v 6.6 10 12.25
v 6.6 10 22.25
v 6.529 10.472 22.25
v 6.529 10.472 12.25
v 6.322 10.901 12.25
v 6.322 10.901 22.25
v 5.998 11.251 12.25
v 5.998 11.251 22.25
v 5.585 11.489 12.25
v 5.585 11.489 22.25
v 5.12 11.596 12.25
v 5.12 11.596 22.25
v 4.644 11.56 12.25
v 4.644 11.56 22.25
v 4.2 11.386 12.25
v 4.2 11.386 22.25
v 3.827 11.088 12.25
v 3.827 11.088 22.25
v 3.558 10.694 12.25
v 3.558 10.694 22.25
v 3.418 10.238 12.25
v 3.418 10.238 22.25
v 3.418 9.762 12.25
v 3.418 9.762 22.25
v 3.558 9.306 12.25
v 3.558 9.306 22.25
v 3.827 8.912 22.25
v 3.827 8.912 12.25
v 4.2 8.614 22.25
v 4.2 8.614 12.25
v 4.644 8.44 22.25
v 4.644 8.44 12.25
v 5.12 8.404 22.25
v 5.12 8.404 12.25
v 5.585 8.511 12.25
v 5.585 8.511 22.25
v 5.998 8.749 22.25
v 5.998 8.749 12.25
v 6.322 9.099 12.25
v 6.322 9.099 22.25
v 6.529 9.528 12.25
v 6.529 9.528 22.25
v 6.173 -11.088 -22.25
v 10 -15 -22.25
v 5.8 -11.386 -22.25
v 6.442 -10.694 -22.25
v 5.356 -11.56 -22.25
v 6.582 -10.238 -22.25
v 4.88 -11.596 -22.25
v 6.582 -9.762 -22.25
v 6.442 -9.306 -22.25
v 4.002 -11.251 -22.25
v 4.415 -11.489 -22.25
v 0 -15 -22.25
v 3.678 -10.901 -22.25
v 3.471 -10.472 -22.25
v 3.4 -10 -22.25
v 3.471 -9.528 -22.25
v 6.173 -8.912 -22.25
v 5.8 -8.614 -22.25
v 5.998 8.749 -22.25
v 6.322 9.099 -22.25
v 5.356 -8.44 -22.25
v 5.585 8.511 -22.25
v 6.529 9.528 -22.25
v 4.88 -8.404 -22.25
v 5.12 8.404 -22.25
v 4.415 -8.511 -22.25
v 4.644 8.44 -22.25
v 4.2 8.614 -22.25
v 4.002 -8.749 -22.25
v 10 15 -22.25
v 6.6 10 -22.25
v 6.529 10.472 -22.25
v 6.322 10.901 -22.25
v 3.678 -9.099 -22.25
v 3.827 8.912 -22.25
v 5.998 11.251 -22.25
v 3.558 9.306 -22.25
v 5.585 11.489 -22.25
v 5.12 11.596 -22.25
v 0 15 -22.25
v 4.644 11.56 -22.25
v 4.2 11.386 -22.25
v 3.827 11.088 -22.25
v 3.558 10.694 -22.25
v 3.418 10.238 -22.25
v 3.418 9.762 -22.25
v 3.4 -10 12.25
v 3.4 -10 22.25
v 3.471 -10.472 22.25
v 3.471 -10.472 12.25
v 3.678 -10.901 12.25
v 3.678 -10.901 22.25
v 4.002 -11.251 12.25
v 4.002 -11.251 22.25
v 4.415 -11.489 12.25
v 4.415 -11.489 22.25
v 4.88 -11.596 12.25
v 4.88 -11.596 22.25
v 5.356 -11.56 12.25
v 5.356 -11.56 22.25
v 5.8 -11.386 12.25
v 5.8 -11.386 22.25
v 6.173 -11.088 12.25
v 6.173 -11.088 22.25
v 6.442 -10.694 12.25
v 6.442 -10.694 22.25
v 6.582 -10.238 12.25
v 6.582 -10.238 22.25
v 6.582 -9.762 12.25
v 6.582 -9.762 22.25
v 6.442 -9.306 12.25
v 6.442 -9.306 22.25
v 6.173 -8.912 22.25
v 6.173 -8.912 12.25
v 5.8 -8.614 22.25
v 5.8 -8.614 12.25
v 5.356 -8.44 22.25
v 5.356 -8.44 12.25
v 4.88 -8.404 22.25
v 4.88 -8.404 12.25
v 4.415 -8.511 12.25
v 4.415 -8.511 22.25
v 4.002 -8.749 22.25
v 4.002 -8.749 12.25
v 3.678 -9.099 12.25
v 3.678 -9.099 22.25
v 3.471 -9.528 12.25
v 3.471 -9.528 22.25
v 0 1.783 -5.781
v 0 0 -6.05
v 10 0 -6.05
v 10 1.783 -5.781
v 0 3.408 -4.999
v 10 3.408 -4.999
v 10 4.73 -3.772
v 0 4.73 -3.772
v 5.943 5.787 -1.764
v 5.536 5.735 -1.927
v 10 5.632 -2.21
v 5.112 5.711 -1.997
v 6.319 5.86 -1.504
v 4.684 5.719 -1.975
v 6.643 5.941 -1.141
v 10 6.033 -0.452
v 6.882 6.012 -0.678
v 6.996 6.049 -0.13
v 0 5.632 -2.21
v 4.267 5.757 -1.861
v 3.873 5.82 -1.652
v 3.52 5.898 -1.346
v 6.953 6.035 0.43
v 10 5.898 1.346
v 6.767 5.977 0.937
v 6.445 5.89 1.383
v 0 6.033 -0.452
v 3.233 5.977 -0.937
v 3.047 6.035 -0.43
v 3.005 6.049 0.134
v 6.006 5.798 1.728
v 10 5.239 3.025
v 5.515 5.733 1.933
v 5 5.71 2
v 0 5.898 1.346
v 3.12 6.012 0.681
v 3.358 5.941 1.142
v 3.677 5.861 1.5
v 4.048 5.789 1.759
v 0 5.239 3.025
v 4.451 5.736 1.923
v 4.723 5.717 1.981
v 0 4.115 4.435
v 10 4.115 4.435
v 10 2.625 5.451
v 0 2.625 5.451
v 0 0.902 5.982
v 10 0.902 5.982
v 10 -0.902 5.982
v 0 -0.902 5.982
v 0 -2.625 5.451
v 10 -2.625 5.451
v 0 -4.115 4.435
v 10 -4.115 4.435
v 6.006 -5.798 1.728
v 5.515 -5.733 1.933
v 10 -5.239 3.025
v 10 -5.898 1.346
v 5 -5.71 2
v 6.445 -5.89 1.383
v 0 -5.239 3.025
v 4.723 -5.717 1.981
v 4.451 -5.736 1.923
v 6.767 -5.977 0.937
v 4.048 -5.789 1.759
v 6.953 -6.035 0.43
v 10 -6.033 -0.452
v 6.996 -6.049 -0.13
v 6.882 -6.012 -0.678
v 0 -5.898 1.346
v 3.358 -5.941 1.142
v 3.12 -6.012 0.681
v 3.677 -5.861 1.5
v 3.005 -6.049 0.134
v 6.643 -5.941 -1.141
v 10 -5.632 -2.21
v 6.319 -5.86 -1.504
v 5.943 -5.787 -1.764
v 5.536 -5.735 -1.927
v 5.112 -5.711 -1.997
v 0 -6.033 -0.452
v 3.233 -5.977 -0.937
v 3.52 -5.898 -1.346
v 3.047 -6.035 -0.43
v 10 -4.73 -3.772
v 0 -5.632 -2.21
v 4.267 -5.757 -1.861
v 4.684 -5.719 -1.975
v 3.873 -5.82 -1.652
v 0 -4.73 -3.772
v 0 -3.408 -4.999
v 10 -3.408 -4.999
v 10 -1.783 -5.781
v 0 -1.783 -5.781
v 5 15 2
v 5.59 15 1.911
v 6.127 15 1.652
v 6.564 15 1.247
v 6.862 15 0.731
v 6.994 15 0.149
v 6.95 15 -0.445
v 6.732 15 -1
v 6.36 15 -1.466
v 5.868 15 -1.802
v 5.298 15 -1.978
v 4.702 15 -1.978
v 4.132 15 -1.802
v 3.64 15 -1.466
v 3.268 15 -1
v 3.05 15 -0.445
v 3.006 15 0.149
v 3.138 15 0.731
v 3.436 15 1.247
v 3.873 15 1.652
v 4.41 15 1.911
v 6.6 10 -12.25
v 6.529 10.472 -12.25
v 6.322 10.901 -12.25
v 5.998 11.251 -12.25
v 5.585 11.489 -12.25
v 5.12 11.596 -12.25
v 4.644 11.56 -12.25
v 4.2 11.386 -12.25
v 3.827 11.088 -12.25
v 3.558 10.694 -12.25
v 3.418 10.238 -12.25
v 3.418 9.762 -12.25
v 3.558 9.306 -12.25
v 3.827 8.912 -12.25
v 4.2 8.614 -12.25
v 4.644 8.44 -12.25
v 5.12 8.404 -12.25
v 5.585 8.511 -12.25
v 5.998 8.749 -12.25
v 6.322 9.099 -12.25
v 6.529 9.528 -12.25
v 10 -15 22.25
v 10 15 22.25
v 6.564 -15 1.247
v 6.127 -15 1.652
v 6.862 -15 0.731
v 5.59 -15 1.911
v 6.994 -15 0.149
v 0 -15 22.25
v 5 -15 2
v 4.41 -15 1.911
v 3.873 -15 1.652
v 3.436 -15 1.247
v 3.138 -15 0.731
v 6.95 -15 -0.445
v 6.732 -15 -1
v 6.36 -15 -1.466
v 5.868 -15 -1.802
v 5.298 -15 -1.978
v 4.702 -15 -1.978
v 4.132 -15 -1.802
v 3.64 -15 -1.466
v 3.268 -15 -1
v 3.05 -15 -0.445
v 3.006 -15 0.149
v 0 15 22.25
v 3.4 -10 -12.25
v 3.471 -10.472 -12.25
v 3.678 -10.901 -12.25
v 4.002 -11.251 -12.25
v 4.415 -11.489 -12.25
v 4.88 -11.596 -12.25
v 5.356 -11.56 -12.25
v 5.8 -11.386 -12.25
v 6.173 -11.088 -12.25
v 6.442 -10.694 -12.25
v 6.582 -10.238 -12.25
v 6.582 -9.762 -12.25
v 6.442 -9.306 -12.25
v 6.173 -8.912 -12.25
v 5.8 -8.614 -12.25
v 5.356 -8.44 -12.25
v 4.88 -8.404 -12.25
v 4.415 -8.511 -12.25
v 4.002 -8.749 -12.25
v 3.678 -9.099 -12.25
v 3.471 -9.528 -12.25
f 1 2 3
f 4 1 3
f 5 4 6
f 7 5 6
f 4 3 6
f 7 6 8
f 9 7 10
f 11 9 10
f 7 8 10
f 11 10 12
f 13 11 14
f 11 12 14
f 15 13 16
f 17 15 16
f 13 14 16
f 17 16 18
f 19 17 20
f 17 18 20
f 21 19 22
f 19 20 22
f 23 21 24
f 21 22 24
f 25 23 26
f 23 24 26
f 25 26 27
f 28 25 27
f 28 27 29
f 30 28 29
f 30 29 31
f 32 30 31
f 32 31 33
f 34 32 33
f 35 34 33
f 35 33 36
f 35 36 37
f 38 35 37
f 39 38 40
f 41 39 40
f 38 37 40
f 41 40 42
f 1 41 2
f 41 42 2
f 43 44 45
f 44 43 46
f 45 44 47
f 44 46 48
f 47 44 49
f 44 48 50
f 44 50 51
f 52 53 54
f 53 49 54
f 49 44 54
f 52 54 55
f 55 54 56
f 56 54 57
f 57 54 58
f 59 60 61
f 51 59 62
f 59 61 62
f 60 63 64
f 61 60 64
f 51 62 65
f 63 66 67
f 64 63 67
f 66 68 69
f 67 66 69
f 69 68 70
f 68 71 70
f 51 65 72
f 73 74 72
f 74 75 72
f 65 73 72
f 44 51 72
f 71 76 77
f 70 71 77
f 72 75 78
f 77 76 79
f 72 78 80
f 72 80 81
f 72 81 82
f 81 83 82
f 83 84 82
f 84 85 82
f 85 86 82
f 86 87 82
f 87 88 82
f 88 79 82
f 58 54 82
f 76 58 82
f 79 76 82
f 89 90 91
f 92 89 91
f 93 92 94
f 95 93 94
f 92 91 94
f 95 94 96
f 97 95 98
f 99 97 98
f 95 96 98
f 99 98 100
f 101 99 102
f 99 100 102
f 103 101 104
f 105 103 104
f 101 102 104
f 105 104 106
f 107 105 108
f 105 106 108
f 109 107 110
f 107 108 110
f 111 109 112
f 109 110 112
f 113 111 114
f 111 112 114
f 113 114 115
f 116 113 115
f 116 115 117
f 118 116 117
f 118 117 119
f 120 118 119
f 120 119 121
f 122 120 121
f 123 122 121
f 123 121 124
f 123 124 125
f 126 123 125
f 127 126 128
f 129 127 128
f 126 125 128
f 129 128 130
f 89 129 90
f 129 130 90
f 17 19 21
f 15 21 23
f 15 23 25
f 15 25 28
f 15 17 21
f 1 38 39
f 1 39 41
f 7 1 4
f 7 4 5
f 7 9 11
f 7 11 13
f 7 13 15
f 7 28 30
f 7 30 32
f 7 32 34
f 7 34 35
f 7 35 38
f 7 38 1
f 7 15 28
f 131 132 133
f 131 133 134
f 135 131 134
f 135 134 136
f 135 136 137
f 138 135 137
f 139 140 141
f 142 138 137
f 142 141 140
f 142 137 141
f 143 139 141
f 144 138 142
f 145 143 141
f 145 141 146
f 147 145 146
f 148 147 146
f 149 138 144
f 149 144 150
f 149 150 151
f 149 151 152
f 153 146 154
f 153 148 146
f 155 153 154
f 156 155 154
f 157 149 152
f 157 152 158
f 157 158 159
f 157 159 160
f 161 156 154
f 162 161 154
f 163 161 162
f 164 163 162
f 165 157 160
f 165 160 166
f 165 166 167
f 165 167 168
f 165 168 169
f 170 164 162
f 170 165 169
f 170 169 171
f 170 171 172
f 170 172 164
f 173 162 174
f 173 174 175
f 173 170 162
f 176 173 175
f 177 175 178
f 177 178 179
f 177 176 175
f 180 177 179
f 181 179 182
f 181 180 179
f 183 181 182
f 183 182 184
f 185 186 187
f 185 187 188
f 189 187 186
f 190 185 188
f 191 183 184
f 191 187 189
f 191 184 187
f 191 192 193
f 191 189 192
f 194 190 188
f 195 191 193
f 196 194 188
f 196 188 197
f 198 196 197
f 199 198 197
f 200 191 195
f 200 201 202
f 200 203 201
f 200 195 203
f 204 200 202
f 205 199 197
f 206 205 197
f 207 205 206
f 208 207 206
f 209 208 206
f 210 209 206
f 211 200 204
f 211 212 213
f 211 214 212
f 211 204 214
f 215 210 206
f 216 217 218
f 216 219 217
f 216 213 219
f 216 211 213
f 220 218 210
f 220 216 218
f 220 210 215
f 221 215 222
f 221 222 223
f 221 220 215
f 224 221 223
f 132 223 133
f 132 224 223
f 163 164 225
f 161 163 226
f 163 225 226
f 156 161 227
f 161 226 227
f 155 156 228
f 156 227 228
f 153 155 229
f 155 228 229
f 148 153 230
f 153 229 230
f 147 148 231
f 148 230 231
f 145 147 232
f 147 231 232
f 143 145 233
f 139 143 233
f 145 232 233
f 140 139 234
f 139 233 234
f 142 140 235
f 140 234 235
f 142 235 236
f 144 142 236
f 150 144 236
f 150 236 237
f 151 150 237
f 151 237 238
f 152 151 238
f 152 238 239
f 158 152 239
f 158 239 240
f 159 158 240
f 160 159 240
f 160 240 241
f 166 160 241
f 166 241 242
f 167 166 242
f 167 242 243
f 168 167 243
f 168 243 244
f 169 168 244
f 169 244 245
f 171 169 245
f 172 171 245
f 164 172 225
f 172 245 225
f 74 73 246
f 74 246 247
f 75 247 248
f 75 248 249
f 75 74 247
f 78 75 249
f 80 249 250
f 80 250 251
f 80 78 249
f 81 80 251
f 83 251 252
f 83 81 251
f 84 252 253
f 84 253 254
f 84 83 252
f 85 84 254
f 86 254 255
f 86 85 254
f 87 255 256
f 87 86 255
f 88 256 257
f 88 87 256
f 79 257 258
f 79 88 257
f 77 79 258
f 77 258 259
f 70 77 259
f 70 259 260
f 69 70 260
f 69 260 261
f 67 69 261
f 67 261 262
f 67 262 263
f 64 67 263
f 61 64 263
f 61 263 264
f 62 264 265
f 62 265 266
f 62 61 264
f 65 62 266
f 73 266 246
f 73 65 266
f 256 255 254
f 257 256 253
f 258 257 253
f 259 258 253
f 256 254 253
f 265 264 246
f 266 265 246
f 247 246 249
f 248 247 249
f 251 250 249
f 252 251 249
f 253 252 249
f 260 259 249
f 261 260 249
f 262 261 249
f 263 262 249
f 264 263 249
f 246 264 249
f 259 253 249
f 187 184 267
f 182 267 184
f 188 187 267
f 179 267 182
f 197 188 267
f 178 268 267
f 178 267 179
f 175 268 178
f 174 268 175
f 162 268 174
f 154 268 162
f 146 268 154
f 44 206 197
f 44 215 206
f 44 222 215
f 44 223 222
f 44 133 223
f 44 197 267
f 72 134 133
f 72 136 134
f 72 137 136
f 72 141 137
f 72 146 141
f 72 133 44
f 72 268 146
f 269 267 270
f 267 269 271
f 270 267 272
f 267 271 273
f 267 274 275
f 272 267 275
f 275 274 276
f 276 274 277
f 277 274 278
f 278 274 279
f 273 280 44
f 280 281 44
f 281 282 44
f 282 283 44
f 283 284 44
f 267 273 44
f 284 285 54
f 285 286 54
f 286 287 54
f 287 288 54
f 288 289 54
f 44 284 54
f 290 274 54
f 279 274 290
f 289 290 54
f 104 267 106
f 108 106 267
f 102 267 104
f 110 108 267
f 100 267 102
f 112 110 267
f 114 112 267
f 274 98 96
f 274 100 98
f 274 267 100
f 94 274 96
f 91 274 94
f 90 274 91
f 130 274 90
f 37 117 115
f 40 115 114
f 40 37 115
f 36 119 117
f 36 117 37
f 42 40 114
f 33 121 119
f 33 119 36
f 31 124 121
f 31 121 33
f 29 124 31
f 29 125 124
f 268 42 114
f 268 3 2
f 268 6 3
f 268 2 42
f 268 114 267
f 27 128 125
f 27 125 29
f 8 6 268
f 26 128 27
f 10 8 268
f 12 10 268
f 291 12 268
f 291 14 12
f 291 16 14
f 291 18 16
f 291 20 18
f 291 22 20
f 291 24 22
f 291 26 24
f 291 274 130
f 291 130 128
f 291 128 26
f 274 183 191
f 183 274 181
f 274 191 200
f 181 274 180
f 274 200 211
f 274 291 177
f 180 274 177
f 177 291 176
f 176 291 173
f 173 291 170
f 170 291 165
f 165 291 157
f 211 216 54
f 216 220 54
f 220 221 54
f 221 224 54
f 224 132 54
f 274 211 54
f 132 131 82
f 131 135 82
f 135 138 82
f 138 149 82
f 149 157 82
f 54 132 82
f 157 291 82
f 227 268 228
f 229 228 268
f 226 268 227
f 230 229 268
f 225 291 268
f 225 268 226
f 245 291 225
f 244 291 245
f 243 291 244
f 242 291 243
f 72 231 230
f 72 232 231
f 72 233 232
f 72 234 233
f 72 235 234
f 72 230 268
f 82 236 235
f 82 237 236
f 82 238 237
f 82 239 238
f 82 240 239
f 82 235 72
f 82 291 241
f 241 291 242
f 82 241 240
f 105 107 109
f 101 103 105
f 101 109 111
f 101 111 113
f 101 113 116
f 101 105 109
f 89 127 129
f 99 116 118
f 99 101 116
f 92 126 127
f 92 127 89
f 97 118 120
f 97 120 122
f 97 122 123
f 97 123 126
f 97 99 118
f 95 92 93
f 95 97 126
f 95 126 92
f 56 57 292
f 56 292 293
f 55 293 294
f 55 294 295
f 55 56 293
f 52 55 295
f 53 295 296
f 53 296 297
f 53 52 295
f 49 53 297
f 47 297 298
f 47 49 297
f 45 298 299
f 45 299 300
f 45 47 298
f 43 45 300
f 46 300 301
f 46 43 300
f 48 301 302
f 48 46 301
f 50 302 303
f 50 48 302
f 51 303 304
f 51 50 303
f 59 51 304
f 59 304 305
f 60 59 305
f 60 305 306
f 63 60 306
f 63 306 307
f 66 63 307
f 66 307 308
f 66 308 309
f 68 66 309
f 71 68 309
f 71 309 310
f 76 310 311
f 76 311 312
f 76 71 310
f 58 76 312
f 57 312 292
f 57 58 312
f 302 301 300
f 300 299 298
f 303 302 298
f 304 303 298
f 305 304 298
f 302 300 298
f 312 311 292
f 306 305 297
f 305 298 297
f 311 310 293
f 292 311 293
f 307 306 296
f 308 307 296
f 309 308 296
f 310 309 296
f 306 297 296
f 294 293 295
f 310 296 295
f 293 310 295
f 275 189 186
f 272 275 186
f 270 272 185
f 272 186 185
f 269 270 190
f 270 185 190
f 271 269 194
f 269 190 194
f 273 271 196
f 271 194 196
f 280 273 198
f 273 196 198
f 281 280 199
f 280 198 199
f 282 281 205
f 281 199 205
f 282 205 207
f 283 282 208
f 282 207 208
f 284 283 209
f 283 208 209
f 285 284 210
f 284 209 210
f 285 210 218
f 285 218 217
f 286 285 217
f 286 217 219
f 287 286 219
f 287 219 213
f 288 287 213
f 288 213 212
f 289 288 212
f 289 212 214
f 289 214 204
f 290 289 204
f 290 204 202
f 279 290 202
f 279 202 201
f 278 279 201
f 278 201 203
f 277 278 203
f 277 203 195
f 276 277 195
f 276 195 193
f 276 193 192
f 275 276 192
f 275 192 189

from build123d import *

# Parameters (mm, degrees)
SKETCH_1_W          = 44.5
SKETCH_1_H          = 30
SKETCH_1_R          = 6.05
EXTRUDE_1_DEPTH     = 10
SKETCH_2_R          = 1.6
CUT_EXTRUDE_1_DEPTH = 10
SKETCH_3_R          = 2
CUT_EXTRUDE_2_DEPTH = 39.66603807


with BuildPart() as part:
    # ｽｹｯﾁ1 → ﾎﾞｽ - 押し出し1 (new body)
    with BuildSketch(Plane(origin=(0, 0, 0), x_dir=(0, 0, -1), z_dir=(1, 0, 0))):
        Rectangle(SKETCH_1_W, SKETCH_1_H)
        Circle(SKETCH_1_R, mode=Mode.SUBTRACT)
    extrude(amount=EXTRUDE_1_DEPTH)

    # ｽｹｯﾁ2 → ｶｯﾄ - 押し出し1 (cut)
    with BuildSketch(Plane.XY.offset(22.25)):
        with Locations((5, 10)):
            Circle(SKETCH_2_R)
        with Locations(Location((5, -10, 0), (0, 0, 180))):
            Circle(SKETCH_2_R)
    cut_extrude_1 = extrude(amount=-CUT_EXTRUDE_1_DEPTH, mode=Mode.SUBTRACT)

    # ｽｹｯﾁ3 → ｶｯﾄ - 押し出し2 (cut, through all)
    with BuildSketch(Plane(origin=(0, 15, 0), x_dir=(1, 0, 0), z_dir=(0, 1, 0))):
        with Locations(Location((5, 0, 0), (0, 0, 270))):
            Circle(SKETCH_3_R)
    extrude(amount=-CUT_EXTRUDE_2_DEPTH, mode=Mode.SUBTRACT)

    # ﾐﾗｰ1: ｶｯﾄ - 押し出し1 across plane
    add(cut_extrude_1.mirror(Plane.XY), mode=Mode.SUBTRACT)


solid = part.part
